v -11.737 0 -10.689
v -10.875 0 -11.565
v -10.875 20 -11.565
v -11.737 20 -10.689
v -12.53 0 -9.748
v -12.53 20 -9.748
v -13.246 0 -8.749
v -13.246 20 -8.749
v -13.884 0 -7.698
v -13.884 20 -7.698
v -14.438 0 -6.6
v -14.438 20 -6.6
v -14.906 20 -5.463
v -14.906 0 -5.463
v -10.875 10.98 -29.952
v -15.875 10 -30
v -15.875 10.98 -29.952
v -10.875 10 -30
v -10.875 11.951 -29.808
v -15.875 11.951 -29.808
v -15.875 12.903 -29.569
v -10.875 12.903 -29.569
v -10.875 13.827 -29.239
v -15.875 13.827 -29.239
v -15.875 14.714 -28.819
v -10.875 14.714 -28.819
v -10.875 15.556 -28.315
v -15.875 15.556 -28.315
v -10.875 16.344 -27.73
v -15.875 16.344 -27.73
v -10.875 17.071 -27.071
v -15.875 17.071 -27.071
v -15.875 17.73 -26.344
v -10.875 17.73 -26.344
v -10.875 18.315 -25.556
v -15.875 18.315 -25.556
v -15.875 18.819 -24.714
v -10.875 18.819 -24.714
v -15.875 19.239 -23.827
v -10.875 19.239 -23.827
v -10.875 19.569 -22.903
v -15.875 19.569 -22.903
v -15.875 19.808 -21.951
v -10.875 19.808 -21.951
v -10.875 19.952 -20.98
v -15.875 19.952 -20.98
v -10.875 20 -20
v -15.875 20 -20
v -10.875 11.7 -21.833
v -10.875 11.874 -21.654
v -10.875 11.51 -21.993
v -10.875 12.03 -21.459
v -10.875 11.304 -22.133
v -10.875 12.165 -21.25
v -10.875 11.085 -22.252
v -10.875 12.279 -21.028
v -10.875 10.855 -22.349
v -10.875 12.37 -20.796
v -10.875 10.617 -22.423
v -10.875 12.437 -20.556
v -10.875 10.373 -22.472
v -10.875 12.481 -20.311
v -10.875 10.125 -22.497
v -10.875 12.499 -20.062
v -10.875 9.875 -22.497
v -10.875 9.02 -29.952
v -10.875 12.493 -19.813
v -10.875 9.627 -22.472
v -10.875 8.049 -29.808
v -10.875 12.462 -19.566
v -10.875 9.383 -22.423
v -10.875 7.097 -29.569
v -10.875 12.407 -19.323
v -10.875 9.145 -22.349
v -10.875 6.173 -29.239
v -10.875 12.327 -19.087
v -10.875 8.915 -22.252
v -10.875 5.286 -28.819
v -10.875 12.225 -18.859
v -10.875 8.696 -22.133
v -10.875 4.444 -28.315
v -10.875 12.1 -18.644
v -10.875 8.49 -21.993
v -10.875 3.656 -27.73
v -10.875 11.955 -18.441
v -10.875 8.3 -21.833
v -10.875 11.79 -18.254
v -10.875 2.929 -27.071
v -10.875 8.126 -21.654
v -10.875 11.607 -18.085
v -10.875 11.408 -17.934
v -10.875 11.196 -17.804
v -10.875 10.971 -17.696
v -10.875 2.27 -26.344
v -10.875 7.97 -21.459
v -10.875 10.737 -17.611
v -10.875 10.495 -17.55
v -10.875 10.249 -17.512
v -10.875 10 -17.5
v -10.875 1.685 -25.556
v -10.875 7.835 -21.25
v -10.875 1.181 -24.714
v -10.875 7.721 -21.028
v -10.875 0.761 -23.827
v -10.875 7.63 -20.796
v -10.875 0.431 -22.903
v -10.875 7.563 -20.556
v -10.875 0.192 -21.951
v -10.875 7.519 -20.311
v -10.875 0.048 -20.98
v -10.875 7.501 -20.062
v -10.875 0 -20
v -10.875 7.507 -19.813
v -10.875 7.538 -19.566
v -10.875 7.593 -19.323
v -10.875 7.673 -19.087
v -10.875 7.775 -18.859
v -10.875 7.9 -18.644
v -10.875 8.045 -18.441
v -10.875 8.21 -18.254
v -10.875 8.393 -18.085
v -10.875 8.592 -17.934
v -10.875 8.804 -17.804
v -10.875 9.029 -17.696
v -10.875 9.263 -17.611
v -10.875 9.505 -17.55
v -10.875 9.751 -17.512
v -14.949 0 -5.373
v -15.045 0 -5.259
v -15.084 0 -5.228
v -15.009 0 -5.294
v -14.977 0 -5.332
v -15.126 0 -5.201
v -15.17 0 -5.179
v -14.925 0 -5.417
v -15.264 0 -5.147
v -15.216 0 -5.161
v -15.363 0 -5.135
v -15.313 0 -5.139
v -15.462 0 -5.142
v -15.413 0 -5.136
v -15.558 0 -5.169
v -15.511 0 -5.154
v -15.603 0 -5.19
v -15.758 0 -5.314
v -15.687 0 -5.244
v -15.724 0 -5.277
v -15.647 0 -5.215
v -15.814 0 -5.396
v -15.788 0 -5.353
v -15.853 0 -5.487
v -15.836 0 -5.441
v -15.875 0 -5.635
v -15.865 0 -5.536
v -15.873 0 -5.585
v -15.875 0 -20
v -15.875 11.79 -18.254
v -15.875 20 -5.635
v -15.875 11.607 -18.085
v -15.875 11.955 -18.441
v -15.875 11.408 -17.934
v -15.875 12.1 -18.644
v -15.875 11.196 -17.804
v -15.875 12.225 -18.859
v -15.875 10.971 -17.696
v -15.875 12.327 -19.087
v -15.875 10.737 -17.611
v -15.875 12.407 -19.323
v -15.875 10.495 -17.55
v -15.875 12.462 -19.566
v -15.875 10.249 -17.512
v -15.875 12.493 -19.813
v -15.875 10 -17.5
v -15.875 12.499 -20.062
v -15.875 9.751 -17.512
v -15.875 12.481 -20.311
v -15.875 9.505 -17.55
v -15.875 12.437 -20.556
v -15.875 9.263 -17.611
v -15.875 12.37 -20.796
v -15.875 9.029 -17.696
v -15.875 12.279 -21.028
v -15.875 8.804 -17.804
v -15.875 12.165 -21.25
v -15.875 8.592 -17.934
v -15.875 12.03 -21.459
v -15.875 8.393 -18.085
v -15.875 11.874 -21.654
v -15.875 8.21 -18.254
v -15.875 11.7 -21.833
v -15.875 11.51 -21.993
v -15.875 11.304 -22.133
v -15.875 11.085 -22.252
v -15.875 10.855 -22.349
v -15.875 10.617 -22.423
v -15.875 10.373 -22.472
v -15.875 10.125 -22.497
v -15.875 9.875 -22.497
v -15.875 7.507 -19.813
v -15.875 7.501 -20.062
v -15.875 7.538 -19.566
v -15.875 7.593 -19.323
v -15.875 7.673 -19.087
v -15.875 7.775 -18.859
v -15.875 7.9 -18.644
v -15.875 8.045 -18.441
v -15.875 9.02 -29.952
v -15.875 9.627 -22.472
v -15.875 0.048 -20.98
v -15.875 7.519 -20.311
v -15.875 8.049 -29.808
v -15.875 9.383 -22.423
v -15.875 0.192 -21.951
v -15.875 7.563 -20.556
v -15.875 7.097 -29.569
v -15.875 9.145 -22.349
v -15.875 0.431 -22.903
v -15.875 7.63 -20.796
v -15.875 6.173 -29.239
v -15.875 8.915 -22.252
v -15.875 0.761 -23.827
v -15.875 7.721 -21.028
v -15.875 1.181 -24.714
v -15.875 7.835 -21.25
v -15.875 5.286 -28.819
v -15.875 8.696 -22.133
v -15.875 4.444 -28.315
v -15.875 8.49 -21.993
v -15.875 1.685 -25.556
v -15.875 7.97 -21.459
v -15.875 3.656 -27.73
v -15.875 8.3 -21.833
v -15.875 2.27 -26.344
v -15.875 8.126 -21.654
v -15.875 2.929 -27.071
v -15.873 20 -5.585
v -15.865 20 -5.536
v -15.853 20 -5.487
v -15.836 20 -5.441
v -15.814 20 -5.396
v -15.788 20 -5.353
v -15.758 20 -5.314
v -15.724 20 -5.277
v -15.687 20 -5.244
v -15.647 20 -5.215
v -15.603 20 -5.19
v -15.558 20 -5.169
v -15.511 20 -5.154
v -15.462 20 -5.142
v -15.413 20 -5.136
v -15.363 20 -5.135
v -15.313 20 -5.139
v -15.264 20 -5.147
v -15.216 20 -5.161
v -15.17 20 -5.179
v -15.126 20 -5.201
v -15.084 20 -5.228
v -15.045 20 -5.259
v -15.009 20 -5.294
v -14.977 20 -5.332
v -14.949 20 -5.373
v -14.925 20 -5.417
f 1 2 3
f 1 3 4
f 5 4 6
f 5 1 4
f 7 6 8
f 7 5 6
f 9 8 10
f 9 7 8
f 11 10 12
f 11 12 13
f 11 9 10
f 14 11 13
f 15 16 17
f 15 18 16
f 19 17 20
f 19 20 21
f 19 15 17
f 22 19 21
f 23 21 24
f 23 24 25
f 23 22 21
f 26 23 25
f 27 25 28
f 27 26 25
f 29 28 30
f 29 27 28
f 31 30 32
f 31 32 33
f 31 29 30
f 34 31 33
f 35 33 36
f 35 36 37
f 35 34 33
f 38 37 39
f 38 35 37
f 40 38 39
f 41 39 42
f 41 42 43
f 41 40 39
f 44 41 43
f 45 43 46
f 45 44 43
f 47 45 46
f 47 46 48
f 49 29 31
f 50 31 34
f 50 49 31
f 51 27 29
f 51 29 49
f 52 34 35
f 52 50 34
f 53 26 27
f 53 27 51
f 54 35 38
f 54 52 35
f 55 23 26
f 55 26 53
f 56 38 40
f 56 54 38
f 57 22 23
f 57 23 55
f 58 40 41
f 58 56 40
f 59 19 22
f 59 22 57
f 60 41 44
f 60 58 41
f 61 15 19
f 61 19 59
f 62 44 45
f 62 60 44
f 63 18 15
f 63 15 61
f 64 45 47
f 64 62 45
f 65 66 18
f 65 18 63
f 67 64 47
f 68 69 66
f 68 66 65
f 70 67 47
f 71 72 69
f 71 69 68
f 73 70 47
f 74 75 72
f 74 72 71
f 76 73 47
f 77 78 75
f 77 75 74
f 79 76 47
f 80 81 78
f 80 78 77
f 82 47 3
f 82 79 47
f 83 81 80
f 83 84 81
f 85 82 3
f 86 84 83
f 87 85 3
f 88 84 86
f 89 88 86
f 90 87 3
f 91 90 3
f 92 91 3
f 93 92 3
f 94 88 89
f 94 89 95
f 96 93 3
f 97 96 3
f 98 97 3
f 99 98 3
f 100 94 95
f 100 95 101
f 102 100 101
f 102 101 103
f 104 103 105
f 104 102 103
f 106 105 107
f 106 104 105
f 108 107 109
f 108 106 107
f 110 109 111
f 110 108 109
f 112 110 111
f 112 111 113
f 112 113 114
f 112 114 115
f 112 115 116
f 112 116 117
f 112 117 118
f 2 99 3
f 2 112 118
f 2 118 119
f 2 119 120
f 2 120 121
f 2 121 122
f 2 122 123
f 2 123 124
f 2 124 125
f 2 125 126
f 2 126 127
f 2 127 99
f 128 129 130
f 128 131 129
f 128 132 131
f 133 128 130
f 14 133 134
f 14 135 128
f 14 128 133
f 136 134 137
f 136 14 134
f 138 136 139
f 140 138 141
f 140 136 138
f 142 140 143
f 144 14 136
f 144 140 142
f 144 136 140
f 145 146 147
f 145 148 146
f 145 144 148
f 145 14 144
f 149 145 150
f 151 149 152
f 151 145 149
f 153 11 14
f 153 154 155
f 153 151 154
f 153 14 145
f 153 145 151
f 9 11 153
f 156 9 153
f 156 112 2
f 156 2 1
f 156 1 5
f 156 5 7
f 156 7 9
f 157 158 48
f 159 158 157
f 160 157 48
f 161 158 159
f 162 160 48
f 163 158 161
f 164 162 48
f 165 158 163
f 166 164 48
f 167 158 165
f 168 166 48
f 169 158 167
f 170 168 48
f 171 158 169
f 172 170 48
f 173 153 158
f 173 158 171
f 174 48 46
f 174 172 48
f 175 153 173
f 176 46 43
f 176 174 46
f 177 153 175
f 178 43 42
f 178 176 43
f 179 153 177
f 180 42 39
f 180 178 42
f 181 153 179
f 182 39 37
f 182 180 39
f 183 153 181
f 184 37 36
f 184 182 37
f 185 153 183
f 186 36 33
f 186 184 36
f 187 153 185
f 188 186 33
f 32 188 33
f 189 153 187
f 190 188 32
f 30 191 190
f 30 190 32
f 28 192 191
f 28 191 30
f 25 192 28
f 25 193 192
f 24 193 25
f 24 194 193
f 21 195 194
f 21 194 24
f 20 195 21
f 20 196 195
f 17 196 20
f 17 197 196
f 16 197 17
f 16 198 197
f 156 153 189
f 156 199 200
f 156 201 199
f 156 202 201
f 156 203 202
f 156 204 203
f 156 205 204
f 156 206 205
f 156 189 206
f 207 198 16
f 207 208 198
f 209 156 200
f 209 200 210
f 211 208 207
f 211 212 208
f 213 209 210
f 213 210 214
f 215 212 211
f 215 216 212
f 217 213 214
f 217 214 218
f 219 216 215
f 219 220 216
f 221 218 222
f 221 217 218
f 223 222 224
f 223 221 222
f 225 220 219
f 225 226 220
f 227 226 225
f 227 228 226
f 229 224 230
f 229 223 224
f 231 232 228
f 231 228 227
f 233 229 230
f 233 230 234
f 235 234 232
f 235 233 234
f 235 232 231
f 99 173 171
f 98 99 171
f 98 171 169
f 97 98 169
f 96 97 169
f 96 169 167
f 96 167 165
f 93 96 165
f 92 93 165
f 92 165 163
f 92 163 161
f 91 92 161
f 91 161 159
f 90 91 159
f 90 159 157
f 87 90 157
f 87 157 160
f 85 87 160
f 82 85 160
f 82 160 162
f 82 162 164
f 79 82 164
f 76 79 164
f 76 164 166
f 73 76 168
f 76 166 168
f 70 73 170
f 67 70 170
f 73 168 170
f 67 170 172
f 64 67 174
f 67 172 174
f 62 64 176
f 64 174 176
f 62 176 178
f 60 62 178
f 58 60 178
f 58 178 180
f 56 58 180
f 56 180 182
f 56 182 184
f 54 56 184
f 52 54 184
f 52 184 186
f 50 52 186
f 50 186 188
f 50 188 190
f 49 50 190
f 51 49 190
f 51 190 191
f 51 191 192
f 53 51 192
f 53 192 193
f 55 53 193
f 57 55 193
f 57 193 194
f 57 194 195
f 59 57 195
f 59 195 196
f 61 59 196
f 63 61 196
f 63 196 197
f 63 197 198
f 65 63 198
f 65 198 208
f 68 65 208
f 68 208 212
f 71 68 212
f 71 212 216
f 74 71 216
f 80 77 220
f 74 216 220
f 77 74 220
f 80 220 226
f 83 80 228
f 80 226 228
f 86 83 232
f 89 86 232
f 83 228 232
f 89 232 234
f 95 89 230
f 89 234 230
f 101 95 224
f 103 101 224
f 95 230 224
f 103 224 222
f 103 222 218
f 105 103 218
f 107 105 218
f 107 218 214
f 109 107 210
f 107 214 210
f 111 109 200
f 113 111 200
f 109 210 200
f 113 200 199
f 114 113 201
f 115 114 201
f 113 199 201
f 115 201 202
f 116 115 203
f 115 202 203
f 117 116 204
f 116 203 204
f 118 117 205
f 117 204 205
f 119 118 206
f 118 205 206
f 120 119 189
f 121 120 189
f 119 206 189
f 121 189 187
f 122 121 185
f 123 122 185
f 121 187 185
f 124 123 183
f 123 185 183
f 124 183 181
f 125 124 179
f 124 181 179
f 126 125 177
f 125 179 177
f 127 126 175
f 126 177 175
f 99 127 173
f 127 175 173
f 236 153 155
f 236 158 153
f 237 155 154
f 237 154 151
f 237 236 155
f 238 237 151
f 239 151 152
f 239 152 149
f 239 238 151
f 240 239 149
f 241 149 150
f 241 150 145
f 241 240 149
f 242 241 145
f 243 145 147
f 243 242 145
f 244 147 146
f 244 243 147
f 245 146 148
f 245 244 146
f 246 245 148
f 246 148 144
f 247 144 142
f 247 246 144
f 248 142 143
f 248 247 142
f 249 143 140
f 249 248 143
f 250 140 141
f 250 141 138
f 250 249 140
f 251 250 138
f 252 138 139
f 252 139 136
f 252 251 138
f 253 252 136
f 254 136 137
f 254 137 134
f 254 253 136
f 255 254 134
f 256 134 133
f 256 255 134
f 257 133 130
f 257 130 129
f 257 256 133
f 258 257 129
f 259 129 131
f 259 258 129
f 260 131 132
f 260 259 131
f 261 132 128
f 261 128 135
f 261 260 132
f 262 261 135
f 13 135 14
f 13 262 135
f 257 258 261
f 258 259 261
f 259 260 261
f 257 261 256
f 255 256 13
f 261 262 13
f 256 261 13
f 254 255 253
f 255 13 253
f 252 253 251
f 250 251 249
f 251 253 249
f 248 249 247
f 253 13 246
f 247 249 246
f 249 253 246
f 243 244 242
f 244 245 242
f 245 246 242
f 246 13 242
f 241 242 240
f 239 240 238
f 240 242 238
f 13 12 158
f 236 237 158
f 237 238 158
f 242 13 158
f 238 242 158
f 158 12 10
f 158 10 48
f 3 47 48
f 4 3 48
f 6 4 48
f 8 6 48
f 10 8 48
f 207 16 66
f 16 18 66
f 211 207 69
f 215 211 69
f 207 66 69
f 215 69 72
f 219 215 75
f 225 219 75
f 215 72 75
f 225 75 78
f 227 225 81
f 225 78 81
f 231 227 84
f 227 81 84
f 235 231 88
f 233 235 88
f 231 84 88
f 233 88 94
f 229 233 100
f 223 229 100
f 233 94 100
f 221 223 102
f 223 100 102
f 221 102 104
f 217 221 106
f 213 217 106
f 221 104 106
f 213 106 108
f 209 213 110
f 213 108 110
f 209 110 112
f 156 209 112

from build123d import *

# Parameters (mm, degrees)
BOSS_EXTRUDE1_DEPTH = 20
FILLET1_R           = 10
SKETCH2_R           = 2.5000000000000018
CUT_EXTRUDE1_DEPTH  = 37.40054944640259
FILLET2_R           = 0.5


with BuildPart() as part:
    # Sketch1 → Boss-Extrude1 (new body)
    with BuildSketch(Plane(origin=(0, 0, 0), x_dir=(1, 0, 0), z_dir=(0, 1, 0))):
        with BuildLine():
            Line((-15.875000000000004, 0), (-15.875, 30))
            Line((-15.875, 30), (-10.875, 30))
            Line((-10.875, 30), (-10.874999999999996, 11.565033506220383))
            ThreePointArc((-10.874999999999996, 11.565033506220383), (-14.57148328070962, 6.299801584177079), (-15.875000000000004, 0))
        make_face()
    extrude(amount=BOSS_EXTRUDE1_DEPTH)

    # Fillet1
    fillet1_edges = [part.edges().sort_by_distance(p)[0] for p in [
        (-13.375, 0, -30),
        (-13.375, 20, -30),
    ]]
    fillet(fillet1_edges, radius=FILLET1_R - 0.0001)  # a hair under: the kernel refuses the full size

    # Sketch2 → Cut-Extrude1 (cut, through all)
    with BuildSketch(Plane.ZY.offset(15.875000000000004)):
        with Locations((-19.999999999999996, 10)):
            Circle(SKETCH2_R)
    extrude(amount=-CUT_EXTRUDE1_DEPTH, mode=Mode.SUBTRACT)

    # Fillet2
    fillet2_edges = [part.edges().sort_by_distance(p)[0] for p in [
        (-15.875000000000004, 10, 2.2e-16),
    ]]
    fillet(fillet2_edges, radius=FILLET2_R)


solid = part.part
